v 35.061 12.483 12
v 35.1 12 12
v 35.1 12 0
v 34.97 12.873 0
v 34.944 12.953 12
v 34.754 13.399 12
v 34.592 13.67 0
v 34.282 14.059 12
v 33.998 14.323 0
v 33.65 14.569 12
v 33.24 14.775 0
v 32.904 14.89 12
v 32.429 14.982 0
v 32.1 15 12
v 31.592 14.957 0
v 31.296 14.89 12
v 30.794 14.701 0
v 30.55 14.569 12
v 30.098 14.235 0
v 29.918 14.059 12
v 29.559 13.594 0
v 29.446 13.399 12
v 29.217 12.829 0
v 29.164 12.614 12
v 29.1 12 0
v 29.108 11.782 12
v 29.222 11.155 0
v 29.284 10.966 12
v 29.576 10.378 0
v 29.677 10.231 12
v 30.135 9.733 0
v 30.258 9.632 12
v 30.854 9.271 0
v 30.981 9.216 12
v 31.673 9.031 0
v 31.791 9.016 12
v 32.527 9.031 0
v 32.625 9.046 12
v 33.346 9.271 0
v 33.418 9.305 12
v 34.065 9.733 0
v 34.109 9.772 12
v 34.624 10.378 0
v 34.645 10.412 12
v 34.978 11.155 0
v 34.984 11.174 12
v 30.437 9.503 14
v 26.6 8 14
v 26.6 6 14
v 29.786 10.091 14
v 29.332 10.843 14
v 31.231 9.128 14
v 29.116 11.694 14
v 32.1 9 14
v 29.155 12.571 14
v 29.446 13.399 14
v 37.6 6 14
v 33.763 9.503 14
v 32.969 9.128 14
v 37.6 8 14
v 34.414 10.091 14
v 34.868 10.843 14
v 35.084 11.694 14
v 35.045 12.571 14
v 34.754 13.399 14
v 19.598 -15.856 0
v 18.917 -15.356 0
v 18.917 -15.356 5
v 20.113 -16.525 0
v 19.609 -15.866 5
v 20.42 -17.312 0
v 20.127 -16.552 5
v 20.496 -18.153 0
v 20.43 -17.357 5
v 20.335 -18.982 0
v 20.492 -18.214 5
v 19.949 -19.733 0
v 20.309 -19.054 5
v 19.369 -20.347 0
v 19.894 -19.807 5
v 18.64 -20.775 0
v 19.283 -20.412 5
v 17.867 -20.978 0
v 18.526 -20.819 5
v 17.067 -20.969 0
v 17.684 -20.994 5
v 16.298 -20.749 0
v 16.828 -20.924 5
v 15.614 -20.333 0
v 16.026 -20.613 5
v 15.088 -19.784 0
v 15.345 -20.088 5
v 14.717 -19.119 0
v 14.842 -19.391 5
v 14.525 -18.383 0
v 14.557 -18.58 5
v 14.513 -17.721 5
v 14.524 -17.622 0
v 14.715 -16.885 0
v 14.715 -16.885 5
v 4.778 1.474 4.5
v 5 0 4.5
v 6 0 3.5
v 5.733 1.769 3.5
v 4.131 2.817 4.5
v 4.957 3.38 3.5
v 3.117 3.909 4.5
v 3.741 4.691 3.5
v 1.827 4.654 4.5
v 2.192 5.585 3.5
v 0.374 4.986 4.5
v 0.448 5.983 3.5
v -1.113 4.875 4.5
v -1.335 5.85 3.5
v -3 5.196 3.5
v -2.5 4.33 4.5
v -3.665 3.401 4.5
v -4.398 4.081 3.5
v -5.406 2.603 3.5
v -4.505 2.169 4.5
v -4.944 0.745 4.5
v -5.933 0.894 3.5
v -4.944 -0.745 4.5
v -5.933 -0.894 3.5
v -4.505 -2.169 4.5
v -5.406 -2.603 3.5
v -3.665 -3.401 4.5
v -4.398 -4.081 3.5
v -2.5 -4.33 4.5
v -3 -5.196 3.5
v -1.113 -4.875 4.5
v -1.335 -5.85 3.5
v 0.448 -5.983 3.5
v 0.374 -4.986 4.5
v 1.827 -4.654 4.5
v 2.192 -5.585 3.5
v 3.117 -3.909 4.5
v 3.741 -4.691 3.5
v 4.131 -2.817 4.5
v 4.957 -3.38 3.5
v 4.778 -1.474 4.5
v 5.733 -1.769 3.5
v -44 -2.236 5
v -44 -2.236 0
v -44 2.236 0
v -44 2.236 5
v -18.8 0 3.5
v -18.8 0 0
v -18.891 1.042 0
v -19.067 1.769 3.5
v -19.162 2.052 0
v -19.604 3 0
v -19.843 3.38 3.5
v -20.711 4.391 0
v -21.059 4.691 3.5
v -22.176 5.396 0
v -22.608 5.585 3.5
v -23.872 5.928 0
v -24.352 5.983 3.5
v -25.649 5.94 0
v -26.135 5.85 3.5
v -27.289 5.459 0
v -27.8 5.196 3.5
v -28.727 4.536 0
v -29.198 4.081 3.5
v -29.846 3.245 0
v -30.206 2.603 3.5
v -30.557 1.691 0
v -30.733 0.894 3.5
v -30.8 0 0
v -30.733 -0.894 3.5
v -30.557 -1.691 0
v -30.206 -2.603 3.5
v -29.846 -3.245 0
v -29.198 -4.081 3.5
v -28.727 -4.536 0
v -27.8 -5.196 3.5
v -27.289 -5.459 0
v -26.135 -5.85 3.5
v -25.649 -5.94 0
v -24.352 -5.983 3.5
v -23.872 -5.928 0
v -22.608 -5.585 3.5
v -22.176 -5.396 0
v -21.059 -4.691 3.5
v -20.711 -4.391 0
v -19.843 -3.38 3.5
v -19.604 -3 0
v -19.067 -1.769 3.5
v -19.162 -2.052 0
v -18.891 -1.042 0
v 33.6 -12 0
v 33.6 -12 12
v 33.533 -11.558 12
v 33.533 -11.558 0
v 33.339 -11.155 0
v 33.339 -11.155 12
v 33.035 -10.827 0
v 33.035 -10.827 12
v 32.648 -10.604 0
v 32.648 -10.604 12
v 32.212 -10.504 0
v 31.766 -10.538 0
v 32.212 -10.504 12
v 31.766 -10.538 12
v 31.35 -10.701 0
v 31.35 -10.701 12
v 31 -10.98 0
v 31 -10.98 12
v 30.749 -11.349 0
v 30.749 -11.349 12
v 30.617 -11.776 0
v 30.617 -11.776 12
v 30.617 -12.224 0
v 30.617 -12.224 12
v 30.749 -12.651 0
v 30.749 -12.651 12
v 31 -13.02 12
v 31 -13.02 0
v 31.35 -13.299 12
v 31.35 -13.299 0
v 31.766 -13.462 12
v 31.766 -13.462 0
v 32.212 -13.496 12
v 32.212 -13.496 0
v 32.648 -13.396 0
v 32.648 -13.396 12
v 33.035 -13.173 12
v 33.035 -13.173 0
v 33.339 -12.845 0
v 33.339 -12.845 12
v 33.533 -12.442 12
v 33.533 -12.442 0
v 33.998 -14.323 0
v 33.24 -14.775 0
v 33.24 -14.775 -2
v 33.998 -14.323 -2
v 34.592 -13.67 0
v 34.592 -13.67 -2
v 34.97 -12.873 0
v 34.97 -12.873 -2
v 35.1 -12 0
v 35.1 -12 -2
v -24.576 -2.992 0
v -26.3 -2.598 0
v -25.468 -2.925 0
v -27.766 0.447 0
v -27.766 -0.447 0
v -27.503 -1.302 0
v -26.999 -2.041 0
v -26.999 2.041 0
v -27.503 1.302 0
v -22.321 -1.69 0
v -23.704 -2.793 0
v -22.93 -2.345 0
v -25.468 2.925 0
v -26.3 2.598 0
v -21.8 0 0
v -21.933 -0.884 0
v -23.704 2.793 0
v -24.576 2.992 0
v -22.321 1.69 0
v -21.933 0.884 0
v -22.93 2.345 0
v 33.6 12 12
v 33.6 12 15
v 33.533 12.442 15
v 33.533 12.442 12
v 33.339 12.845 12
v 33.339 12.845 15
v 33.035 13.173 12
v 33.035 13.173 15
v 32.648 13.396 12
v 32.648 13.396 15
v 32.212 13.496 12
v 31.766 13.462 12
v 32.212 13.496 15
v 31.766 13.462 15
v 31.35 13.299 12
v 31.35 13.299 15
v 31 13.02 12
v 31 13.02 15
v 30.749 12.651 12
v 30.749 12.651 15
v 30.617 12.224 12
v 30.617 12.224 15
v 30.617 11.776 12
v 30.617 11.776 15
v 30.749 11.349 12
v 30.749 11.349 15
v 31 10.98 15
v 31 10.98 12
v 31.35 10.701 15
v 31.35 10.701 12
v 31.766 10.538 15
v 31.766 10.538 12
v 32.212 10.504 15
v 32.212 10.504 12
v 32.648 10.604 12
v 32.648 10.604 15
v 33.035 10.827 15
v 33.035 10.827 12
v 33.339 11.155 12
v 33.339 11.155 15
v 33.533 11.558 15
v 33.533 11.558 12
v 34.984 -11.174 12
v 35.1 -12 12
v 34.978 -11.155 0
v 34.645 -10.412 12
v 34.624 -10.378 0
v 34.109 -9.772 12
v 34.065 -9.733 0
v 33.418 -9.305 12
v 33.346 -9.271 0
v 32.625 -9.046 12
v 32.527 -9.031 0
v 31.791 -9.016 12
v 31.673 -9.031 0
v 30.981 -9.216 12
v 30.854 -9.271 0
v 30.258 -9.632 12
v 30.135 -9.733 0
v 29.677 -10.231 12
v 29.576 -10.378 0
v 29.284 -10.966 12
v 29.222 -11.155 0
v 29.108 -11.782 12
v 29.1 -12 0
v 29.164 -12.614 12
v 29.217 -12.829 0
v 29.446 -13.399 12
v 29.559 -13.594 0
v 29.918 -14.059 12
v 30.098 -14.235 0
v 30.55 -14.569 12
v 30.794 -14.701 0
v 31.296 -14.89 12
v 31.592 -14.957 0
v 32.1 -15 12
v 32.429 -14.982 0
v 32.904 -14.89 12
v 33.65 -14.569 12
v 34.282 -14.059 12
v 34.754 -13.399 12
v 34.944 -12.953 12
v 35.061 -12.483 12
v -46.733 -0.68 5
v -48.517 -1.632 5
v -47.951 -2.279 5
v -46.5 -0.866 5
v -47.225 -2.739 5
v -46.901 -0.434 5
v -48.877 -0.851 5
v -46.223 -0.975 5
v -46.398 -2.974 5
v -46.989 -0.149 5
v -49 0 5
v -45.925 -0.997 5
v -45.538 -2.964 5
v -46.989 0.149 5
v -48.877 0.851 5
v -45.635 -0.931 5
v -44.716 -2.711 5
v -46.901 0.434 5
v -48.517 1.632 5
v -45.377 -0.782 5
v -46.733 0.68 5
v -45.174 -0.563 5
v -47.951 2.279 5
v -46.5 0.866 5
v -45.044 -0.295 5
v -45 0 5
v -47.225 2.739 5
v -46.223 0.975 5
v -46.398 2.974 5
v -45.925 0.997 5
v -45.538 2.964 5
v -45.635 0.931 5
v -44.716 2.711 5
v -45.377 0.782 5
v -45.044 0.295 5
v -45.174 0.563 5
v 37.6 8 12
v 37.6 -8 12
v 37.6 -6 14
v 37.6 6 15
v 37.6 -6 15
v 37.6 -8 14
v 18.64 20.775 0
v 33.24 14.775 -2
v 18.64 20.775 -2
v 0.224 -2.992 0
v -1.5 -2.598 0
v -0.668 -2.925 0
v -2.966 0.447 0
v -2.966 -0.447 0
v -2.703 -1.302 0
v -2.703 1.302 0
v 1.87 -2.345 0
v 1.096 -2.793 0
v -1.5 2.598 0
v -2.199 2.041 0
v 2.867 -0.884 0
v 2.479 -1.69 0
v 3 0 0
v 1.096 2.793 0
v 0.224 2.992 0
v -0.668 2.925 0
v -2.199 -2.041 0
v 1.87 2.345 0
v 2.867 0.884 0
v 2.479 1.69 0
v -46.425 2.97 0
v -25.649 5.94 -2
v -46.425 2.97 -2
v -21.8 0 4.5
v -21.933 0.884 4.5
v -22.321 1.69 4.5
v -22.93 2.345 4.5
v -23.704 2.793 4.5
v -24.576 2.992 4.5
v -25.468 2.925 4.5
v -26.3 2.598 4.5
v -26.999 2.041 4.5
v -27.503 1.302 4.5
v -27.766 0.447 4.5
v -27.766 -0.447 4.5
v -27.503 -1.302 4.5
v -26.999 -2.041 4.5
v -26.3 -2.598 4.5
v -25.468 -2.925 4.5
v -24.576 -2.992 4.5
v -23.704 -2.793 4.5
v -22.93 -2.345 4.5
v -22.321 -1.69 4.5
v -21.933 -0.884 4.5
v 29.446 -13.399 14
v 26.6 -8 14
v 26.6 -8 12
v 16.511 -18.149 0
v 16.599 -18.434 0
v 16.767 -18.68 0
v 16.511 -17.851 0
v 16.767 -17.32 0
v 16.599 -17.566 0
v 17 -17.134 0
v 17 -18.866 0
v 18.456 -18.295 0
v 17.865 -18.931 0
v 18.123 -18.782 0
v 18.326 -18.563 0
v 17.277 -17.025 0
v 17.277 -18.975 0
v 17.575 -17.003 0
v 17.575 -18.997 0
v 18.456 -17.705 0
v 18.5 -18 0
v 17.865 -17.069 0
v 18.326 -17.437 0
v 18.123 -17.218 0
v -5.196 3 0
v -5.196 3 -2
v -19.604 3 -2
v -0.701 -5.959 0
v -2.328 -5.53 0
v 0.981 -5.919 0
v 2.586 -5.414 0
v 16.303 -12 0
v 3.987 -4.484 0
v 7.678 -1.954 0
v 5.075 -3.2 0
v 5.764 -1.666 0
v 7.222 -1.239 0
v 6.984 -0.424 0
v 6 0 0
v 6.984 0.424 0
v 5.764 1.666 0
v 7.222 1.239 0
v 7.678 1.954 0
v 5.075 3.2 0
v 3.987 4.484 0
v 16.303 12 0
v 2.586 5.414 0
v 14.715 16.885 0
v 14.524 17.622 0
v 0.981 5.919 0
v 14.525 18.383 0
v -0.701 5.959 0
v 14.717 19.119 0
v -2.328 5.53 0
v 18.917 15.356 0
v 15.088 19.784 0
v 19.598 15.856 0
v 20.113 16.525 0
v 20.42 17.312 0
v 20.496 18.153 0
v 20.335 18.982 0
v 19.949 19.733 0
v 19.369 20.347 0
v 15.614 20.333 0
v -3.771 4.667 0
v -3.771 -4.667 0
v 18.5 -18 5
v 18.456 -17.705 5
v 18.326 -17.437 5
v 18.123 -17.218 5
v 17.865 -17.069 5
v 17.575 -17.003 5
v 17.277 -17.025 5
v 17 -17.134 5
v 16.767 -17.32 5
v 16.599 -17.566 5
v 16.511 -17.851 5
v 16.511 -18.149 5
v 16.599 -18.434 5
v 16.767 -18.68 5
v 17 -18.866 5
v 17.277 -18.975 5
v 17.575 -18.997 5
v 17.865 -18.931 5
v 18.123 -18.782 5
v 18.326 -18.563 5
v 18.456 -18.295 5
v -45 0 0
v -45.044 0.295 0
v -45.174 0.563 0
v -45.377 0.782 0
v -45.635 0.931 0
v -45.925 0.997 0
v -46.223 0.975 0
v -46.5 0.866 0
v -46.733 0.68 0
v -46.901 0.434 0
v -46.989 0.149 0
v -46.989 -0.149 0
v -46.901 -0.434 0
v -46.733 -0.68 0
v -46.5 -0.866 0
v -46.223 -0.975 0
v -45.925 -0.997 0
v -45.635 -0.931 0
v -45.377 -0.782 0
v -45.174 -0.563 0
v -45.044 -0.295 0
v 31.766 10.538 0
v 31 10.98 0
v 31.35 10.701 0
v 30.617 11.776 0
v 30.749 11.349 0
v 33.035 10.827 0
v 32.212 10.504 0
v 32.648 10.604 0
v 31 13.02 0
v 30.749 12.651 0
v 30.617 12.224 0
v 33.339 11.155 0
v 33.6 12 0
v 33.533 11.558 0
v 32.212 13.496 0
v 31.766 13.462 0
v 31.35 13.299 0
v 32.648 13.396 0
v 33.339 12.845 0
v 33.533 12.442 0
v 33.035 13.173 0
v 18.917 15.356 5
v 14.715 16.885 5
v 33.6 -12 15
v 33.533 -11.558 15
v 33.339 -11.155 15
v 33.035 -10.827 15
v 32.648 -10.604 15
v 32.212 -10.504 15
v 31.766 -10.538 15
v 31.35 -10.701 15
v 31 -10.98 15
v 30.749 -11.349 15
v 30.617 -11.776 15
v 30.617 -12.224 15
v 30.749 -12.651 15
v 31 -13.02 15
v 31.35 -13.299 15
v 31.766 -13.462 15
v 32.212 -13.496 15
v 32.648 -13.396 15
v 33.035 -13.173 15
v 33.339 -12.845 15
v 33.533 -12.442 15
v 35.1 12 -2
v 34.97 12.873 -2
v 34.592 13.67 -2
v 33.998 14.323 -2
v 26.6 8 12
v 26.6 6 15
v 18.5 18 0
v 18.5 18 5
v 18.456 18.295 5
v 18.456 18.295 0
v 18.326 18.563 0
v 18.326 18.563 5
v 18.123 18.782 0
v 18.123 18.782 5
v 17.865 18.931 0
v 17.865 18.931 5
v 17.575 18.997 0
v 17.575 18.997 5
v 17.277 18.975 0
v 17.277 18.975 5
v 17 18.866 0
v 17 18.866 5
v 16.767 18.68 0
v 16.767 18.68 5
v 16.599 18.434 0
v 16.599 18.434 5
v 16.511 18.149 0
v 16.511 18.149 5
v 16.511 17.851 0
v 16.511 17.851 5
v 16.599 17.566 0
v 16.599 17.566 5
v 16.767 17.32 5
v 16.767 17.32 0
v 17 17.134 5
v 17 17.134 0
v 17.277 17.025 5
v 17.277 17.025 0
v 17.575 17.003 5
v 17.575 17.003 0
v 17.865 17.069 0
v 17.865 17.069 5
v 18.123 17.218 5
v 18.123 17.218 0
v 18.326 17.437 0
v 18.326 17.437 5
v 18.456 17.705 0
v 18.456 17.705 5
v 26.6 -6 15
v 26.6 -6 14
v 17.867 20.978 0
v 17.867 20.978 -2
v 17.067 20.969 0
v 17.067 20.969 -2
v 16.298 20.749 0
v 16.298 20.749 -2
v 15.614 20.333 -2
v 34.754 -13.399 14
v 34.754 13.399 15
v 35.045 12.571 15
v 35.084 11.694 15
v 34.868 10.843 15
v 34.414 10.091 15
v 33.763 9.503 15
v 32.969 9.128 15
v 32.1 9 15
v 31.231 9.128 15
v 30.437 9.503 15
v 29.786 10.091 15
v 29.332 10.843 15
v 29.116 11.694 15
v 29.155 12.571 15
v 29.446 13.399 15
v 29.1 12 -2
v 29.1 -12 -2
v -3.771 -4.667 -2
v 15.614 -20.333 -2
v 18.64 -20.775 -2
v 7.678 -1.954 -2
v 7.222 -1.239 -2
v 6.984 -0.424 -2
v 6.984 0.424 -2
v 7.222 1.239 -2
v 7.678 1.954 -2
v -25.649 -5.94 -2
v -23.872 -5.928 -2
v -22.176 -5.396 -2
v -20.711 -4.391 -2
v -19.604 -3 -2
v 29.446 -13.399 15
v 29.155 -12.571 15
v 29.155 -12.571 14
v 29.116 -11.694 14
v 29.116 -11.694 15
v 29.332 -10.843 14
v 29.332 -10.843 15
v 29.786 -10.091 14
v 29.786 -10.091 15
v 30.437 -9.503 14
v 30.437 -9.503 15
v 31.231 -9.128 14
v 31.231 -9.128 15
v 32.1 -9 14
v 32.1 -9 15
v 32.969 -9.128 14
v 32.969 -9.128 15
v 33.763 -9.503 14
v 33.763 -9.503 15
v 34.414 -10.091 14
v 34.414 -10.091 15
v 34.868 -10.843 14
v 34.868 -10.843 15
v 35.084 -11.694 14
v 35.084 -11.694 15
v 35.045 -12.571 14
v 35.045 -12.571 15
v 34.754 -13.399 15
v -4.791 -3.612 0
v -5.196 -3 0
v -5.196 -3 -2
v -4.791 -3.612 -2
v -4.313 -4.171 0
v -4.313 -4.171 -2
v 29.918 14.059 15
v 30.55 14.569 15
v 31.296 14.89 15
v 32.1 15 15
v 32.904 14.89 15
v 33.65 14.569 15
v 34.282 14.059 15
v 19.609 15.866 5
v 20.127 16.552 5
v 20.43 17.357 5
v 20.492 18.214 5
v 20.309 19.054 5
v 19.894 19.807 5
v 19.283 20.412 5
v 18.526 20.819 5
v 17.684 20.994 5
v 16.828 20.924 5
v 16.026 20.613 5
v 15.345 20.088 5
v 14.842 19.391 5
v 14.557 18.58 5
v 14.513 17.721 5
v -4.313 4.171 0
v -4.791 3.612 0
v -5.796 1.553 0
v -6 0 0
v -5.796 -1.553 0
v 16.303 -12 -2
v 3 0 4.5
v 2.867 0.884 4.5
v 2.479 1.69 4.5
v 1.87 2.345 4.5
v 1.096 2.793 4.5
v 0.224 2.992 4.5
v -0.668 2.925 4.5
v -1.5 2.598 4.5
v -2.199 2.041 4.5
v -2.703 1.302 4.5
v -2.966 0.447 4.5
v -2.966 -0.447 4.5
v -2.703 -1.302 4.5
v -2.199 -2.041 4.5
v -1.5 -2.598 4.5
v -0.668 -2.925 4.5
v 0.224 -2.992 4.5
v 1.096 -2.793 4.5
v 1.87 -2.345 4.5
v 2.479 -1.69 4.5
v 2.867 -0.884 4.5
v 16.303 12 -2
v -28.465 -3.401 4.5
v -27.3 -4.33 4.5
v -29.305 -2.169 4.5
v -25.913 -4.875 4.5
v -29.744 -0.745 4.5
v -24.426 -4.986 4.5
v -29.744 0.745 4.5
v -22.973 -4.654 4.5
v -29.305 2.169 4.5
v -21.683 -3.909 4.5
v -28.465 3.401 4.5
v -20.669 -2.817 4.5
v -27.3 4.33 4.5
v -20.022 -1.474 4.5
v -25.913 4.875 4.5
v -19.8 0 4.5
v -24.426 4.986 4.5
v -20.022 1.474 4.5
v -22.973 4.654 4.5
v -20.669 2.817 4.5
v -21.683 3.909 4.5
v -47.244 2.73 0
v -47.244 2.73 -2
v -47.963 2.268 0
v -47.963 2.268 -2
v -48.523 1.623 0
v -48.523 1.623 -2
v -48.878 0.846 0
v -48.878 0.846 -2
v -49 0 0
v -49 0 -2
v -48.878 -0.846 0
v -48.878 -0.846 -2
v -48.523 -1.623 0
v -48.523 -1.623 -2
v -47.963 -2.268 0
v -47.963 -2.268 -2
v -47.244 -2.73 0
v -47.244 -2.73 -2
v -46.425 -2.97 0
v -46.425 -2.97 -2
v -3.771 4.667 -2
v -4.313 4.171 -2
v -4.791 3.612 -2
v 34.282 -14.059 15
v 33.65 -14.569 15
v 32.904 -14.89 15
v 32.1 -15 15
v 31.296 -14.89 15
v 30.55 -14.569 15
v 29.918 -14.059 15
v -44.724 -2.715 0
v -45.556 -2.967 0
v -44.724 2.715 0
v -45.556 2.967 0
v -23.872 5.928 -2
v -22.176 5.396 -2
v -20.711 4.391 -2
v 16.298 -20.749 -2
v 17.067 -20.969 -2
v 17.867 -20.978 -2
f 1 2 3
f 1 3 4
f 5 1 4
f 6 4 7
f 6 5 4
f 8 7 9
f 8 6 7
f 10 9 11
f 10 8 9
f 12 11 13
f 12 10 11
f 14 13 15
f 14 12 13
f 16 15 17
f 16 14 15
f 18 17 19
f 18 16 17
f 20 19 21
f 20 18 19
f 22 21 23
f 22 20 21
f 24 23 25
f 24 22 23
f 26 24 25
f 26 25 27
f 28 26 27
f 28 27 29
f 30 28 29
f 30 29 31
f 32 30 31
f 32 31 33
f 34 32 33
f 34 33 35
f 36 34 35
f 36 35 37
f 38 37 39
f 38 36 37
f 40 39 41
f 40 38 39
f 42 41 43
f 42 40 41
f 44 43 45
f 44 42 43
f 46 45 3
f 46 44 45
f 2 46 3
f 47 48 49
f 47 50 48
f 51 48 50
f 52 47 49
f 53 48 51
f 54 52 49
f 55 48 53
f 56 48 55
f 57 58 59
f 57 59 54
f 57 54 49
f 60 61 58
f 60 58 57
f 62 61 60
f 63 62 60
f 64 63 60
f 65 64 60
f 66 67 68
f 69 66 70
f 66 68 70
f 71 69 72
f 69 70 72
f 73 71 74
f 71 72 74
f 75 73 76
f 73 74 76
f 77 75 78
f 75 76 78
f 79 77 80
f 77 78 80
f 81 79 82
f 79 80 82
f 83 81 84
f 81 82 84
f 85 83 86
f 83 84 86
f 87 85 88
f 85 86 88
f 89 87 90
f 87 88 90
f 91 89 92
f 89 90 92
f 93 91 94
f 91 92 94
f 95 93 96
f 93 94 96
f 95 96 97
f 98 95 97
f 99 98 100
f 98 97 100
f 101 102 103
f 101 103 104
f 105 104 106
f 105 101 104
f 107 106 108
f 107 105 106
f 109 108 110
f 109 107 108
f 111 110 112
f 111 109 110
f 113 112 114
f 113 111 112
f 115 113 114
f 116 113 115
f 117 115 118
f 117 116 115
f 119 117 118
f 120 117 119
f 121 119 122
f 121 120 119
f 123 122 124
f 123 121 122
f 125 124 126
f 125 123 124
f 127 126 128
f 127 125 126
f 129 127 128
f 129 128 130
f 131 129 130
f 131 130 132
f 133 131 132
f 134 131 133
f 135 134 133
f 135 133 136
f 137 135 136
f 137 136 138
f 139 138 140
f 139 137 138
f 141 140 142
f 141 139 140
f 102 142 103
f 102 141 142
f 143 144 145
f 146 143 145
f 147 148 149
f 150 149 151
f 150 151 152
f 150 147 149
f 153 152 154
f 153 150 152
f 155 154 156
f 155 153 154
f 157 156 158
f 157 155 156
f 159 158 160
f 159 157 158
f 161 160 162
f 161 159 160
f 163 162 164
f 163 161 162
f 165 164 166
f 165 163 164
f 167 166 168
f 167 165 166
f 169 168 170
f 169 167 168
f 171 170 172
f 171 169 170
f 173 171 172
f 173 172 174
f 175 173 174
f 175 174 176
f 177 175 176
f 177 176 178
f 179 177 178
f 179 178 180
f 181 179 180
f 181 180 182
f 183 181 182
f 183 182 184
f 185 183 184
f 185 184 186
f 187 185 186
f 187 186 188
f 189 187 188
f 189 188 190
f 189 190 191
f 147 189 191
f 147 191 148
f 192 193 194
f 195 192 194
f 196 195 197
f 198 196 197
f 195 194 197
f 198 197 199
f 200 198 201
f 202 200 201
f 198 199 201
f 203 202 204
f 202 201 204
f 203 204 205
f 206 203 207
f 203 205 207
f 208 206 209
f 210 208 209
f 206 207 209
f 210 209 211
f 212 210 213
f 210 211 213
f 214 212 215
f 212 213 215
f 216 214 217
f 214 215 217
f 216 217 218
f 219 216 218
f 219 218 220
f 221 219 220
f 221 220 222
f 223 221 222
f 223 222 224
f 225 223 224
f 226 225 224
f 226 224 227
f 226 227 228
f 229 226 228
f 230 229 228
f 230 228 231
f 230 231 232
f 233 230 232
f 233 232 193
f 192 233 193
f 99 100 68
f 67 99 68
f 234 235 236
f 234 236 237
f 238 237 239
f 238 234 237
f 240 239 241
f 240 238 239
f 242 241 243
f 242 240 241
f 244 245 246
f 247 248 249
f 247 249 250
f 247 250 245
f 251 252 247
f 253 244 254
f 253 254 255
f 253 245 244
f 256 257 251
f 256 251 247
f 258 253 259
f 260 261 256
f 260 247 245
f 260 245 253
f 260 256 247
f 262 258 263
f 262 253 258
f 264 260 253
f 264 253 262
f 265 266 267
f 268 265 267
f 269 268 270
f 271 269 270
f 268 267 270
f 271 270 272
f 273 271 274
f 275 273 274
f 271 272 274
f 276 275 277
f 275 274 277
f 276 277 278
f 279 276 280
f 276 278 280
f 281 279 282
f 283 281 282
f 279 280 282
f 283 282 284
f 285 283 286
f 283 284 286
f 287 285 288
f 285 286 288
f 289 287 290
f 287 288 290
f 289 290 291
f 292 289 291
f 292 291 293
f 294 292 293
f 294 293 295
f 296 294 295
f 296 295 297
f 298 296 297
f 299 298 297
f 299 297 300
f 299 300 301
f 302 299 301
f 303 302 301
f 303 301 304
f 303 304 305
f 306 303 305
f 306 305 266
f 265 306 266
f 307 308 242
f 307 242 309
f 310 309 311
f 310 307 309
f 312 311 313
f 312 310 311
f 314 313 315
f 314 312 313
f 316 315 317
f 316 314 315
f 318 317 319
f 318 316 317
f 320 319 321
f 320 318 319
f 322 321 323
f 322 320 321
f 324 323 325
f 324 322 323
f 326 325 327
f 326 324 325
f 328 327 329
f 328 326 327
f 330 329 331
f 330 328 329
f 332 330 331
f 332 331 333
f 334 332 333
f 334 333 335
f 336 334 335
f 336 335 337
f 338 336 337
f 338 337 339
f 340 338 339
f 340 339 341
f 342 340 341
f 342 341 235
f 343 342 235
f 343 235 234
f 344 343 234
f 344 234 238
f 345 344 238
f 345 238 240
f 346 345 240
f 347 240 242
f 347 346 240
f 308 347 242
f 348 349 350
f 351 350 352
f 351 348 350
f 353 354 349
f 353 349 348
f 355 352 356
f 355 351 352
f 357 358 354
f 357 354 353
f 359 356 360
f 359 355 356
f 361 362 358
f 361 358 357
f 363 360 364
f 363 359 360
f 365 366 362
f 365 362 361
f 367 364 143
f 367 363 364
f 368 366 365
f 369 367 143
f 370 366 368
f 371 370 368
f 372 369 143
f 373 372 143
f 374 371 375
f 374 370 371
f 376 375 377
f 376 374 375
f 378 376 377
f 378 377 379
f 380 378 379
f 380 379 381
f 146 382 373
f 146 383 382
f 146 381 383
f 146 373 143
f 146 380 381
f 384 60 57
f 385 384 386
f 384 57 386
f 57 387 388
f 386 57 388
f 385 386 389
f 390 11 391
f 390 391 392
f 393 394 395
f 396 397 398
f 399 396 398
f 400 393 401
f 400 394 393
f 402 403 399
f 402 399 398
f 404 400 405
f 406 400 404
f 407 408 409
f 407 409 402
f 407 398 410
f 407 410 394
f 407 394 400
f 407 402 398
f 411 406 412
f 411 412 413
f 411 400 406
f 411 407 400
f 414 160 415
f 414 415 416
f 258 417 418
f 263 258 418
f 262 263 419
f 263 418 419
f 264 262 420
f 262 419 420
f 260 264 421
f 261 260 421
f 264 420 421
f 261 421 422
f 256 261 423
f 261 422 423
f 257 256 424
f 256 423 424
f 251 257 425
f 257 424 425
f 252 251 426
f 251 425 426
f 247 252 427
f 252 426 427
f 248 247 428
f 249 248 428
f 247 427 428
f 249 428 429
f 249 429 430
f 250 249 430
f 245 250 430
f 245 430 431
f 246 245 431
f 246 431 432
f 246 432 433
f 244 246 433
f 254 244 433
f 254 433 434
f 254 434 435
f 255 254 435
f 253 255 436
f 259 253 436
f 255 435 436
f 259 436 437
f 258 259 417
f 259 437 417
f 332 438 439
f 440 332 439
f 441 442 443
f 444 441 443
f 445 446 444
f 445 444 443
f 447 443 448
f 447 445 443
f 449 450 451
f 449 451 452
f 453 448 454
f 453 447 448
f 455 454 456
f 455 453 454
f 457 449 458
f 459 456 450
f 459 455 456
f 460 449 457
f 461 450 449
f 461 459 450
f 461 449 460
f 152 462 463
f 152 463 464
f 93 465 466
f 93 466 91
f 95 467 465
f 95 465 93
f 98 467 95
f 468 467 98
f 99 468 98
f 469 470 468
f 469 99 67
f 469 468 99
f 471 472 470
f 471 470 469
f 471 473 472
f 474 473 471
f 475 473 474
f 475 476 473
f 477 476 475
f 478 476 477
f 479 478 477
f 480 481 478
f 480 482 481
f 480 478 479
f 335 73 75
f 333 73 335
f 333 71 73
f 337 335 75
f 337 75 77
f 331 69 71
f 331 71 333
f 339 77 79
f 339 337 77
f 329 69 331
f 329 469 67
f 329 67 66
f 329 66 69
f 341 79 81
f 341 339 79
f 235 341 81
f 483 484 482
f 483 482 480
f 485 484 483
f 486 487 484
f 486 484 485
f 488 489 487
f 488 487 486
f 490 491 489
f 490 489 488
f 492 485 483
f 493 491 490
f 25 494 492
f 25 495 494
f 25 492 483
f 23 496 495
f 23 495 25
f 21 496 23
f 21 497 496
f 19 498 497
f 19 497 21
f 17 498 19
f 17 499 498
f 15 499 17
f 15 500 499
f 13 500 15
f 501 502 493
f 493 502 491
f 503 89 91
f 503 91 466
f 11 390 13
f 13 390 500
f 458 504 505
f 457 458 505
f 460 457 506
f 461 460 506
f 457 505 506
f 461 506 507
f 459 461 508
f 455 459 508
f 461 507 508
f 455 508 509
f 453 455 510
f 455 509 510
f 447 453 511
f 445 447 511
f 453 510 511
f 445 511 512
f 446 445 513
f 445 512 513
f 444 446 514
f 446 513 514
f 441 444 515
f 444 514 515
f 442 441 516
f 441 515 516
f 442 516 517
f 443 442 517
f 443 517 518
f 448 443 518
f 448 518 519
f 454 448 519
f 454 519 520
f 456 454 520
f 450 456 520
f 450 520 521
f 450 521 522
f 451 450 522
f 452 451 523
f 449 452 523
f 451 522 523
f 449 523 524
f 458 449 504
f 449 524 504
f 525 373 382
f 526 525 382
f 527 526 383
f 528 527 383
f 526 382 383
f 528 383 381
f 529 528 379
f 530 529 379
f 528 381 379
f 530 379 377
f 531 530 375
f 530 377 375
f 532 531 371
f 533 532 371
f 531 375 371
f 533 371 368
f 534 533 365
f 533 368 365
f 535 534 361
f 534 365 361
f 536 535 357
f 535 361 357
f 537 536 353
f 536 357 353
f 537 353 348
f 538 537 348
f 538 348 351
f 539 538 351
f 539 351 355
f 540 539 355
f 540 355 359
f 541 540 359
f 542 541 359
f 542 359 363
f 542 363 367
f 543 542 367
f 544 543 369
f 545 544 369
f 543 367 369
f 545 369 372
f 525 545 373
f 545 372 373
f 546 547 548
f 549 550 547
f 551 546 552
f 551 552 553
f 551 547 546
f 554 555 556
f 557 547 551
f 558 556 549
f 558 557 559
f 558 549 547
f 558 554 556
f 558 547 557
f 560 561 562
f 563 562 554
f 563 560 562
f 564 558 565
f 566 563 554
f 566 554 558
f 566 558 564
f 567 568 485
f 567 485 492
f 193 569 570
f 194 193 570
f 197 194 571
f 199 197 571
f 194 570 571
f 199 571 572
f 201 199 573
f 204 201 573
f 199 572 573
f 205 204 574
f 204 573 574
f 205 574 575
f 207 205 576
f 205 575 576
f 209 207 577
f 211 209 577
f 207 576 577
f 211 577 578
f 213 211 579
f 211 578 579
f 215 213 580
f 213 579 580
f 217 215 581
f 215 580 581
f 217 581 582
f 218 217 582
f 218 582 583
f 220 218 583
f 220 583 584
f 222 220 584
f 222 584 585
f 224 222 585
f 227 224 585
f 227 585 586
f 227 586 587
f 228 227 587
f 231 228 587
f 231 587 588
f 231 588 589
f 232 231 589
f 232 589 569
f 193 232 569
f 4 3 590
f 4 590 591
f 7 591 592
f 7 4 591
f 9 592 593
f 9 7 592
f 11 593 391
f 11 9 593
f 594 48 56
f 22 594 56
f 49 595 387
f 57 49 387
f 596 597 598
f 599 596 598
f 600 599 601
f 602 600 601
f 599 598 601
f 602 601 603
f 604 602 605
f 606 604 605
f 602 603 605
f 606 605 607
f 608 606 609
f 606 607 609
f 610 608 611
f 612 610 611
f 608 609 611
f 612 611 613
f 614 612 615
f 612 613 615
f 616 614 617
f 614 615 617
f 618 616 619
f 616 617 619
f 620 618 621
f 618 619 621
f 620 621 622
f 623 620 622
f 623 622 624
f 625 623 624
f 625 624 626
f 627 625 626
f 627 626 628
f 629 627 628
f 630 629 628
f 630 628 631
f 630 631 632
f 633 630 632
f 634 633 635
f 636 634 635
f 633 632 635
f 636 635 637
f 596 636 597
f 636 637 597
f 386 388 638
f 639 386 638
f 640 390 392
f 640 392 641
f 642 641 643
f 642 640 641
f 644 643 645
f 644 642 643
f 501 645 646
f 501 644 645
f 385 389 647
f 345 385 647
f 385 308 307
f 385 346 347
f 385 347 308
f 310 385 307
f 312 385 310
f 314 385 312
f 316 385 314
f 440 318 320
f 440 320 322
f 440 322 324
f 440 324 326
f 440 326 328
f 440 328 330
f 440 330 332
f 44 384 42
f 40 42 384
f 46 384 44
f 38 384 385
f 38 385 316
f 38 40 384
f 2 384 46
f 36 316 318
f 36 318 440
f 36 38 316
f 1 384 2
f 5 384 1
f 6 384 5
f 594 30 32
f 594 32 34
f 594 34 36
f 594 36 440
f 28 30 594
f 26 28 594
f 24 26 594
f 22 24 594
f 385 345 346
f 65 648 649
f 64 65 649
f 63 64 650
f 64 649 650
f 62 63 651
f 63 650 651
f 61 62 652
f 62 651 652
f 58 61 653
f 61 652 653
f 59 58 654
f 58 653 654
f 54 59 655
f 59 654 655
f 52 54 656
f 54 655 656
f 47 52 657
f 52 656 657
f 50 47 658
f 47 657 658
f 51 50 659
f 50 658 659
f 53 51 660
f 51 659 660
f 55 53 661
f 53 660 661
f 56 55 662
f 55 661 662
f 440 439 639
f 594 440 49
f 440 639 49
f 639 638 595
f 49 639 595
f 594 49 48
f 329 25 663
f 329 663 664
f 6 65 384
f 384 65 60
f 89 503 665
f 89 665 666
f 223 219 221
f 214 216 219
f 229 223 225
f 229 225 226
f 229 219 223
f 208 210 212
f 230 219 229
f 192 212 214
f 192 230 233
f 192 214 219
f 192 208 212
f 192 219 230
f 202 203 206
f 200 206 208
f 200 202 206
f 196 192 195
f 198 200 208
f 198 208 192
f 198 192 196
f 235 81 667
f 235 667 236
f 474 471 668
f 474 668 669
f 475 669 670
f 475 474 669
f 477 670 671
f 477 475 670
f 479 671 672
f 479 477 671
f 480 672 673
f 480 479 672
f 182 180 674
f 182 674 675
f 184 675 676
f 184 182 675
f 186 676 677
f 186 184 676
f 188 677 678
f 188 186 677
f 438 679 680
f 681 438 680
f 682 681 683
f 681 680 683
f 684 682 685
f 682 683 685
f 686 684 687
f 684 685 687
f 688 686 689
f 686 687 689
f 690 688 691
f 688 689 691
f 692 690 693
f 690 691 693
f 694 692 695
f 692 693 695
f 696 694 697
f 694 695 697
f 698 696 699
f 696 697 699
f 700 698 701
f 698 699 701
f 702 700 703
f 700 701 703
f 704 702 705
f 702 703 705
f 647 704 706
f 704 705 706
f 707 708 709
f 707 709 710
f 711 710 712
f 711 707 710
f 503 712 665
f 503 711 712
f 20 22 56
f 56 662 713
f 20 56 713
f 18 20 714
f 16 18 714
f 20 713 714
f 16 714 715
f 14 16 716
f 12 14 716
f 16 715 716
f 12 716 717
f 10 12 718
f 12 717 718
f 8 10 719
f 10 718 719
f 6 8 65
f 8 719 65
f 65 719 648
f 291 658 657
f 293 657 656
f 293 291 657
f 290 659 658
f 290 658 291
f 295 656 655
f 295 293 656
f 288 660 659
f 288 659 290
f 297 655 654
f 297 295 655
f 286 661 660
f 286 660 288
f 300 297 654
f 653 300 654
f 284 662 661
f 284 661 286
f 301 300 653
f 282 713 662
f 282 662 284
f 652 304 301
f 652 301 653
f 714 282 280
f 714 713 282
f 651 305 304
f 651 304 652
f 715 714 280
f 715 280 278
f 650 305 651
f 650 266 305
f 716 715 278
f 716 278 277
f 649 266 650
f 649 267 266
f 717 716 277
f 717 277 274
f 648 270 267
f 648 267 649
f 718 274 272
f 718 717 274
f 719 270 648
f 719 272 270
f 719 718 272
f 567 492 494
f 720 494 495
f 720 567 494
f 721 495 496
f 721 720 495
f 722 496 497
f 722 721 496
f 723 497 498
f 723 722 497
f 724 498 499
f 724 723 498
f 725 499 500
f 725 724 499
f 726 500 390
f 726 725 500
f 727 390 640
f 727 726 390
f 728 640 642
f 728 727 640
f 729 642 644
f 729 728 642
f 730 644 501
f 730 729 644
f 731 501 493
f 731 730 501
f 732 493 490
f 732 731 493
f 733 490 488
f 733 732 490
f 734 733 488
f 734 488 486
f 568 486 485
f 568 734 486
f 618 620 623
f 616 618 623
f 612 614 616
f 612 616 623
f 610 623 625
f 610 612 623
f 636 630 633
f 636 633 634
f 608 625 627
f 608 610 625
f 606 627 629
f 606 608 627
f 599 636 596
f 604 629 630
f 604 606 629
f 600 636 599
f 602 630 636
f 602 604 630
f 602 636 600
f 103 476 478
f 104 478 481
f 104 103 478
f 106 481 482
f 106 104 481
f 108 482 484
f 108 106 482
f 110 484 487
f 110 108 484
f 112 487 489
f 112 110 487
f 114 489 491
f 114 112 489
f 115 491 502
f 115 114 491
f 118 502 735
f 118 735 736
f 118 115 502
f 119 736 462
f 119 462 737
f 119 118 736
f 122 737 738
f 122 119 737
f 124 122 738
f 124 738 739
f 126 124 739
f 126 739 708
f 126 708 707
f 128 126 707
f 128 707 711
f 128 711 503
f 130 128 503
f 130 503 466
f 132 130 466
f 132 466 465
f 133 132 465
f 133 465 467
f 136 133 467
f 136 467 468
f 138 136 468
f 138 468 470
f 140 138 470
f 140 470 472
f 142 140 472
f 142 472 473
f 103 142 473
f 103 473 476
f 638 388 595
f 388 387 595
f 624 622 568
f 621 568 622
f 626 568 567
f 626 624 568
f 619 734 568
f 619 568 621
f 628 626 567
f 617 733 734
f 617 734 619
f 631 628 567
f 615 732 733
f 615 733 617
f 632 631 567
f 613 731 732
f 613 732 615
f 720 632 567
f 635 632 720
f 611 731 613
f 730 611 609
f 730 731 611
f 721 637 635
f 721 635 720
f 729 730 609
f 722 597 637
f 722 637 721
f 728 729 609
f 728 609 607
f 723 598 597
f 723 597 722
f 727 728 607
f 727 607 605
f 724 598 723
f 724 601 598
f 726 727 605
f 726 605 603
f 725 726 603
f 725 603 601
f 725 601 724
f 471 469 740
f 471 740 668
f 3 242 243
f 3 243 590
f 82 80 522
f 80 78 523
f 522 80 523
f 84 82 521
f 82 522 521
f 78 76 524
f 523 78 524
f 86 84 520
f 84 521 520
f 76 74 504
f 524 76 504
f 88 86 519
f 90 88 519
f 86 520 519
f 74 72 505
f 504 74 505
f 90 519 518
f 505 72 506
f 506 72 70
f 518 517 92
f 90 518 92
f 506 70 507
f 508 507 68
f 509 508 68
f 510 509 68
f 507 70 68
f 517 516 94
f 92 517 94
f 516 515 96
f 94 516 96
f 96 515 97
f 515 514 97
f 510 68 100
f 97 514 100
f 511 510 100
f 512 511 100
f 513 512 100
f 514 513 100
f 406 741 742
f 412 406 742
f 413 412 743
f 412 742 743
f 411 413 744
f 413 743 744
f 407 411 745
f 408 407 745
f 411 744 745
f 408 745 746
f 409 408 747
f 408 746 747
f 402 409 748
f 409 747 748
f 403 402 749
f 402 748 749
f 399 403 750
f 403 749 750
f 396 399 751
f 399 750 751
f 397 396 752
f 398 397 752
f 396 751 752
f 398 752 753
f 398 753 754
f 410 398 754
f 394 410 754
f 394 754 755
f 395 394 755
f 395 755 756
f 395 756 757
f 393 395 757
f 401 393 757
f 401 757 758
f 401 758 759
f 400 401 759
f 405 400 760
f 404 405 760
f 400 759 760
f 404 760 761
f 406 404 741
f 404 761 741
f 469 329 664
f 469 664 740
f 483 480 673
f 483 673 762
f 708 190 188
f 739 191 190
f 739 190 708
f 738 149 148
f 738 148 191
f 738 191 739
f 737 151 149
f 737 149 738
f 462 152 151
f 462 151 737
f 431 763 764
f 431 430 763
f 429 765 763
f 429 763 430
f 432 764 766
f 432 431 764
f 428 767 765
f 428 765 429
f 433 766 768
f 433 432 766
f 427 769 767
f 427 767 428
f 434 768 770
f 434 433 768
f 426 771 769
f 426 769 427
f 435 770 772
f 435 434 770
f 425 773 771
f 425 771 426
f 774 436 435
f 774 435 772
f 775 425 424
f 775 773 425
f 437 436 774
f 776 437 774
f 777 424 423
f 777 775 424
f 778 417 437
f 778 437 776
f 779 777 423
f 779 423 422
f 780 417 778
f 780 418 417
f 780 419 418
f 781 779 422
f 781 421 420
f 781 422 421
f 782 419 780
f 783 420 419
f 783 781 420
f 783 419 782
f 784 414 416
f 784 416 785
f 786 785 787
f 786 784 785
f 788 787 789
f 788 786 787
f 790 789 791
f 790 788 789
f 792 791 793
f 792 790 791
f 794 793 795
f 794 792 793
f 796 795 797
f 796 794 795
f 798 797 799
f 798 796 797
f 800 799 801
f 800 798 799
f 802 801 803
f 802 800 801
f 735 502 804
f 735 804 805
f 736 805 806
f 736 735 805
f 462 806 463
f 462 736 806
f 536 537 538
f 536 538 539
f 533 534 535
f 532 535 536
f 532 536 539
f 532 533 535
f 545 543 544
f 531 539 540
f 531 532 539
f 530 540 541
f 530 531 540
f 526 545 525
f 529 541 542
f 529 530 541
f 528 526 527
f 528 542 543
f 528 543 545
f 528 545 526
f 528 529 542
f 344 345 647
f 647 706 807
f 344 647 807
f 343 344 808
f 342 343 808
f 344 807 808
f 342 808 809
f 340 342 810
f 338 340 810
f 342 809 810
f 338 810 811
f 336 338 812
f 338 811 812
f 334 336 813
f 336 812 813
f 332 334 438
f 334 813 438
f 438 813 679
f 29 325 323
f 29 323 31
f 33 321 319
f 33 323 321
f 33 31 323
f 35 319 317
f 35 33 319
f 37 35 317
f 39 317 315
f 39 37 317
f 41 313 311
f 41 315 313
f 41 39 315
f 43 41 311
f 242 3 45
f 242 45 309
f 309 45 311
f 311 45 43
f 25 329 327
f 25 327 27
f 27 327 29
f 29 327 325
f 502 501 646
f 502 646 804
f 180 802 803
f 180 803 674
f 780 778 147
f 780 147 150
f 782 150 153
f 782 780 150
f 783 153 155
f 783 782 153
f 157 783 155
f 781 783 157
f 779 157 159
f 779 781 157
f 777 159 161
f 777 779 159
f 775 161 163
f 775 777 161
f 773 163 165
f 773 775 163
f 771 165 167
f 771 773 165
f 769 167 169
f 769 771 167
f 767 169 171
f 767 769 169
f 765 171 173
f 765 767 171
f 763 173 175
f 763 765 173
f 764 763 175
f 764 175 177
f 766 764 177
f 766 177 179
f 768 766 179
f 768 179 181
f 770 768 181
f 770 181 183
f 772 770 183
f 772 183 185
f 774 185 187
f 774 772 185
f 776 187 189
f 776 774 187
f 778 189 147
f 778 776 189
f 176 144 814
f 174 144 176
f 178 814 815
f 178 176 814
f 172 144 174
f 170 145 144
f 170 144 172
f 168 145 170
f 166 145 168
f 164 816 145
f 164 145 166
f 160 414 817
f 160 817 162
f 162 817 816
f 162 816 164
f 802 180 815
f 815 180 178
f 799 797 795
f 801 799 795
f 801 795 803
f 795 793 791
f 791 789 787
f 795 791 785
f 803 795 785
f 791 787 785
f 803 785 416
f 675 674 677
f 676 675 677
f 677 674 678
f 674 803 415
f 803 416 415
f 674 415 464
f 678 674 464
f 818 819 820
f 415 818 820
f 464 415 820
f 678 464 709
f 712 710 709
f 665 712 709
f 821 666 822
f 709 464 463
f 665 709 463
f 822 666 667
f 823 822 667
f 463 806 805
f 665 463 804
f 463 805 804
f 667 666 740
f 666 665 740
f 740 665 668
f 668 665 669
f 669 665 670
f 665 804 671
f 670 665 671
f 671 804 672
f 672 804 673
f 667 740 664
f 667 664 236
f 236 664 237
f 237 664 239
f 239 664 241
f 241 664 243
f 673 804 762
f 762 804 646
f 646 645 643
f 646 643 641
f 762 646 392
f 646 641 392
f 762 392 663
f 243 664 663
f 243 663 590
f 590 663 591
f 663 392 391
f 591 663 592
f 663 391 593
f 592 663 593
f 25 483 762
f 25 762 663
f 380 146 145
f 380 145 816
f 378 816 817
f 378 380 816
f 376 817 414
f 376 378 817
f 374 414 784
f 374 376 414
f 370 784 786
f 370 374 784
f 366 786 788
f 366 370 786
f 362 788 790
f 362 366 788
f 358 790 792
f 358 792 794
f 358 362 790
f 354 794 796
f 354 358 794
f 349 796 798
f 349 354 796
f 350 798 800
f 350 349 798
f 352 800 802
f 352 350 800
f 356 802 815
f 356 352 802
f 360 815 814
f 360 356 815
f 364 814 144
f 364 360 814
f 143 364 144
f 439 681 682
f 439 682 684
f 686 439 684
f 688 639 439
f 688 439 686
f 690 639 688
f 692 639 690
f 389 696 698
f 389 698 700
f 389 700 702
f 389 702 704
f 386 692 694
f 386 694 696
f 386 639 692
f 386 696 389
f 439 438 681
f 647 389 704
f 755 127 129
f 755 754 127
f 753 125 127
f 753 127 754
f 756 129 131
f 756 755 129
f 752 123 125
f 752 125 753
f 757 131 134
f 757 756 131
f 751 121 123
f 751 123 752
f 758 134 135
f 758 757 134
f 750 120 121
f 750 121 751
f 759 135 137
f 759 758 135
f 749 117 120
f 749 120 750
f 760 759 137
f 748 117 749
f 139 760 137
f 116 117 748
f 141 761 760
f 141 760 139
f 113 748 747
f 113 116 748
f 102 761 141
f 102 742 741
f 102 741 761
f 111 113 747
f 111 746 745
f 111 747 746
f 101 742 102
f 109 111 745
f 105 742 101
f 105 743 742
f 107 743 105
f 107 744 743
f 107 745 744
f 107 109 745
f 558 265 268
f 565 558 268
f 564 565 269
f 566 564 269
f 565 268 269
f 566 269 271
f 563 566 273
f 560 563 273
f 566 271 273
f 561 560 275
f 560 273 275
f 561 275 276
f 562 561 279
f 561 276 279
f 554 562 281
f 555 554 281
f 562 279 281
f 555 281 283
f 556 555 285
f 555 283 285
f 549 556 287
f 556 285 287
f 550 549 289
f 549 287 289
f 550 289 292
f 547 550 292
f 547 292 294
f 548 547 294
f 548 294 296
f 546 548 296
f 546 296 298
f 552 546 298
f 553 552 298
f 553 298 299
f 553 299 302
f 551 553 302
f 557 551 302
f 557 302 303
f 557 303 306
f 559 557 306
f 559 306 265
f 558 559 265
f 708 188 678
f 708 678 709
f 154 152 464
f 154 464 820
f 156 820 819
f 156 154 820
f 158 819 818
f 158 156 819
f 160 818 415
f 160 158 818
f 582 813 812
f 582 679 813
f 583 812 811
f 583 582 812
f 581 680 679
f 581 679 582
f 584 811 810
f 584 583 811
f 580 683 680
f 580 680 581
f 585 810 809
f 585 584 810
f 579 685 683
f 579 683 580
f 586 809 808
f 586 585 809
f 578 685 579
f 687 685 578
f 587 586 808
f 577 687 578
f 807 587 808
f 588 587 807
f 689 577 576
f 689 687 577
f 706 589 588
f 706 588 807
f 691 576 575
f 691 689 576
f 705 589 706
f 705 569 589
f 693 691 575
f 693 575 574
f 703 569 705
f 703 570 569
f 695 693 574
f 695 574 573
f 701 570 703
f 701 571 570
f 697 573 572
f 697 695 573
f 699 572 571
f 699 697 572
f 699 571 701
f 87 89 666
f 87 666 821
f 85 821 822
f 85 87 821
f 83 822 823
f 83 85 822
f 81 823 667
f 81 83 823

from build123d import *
from build123d.topology import SkipClean

# Parameters (mm, degrees)
BOSS_EXTRUDE1_DEPTH = 2
BOSS_EXTRUDE2_START = 4.5
SKETCH2_R           = 6
SKETCH2_R_2         = 3
BOSS_EXTRUDE2_DEPTH = 4.5
CHAMFER1_SIZE       = 1
BOSS_EXTRUDE3_START = 5
SKETCH3_R           = 1
BOSS_EXTRUDE3_DEPTH = 5
BOSS_EXTRUDE4_START = 15
SKETCH4_R           = 3
SKETCH4_R_2         = 1.5
BOSS_EXTRUDE4_DEPTH = 15
SKETCH5_R           = 1.5
BOSS_EXTRUDE5_DEPTH = 3
CUT_EXTRUDE1_DEPTH  = 1


with BuildPart() as part:
    # Sketch1 → Boss-Extrude1 (new body)
    with BuildSketch(Plane.XY):
        with BuildLine():
            Line((-5.196152423, 3), (-19.603847577, 3))
            ThreePointArc((-19.603847577, 3), (-22.176137566, 5.39586378), (-25.649056604, 5.939621443))
            Line((-25.649056604, 5.939621443), (-46.424528302, 2.969810721))
            ThreePointArc((-46.424528302, 2.969810721), (-49, 0), (-46.424528302, -2.969810721))
            Line((-46.424528302, -2.969810721), (-25.649056604, -5.939621443))
            ThreePointArc((-25.649056604, -5.939621443), (-22.176137566, -5.39586378), (-19.603847577, -3))
            Line((-19.603847577, -3), (-5.196152423, -3))
            ThreePointArc((-5.196152423, -3), (-4.560521825, -3.898928146), (-3.771341235, -4.666581756))
            Line((-3.771341235, -4.666581756), (15.614329382, -20.333290878))
            ThreePointArc((15.614329382, -20.333290878), (17.066851522, -20.968565714), (18.640337336, -20.774820852))
            Line((18.640337336, -20.774820852), (33.240337336, -14.774820852))
            ThreePointArc((33.240337336, -14.774820852), (34.592088683, -13.670177833), (35.1, -12))
            Line((35.1, -12), (35.1, 12))
            ThreePointArc((35.1, 12), (34.592088683, 13.670177833), (33.240337336, 14.774820852))
            Line((33.240337336, 14.774820852), (18.640337336, 20.774820852))
            ThreePointArc((18.640337336, 20.774820852), (17.066851522, 20.968565714), (15.614329382, 20.333290878))
            Line((15.614329382, 20.333290878), (-3.771341235, 4.666581756))
            ThreePointArc((-3.771341235, 4.666581756), (-4.560521825, 3.898928146), (-5.196152423, 3))
        make_face()
        with BuildLine():
            Line((7.677811186, 1.954226556), (16.302661255, 12))
            Line((16.302661255, 12), (29.1, 12))
            Line((29.1, 12), (29.1, -12))
            Line((29.1, -12), (16.302661255, -12))
            Line((16.302661255, -12), (7.677811186, -1.954226556))
            ThreePointArc((7.677811186, -1.954226556), (6.953991883, 0), (7.677811186, 1.954226556))
        make_face(mode=Mode.SUBTRACT)
    extrude(amount=-BOSS_EXTRUDE1_DEPTH)

    # Sketch2 → Boss-Extrude2 (add)
    # profile 1 of 2: a face of its own
    with BuildSketch(Plane.XY.offset(BOSS_EXTRUDE2_START)):
        with Locations((-24.8, 0)):
            Circle(SKETCH2_R)
        with Locations((-24.8, 0)):
            Circle(SKETCH2_R_2, mode=Mode.SUBTRACT)
    # profile 2 of 2: a face of its own
    with BuildSketch(Plane.XY.offset(BOSS_EXTRUDE2_START)):
        Circle(SKETCH2_R)
        Circle(SKETCH2_R_2, mode=Mode.SUBTRACT)
    extrude(amount=-BOSS_EXTRUDE2_DEPTH)

    # Chamfer1
    chamfer1_edges = [part.edges().sort_by_distance(p)[0] for p in [
        (-30.8, 0, 4.5),
        (-6, 0, 4.5),
    ]]
    chamfer(chamfer1_edges, length=CHAMFER1_SIZE)

    # Sketch3 → Boss-Extrude3 (add)
    # profile 1 of 3: a face of its own
    with SkipClean():  # the faces are left unmerged after this step: merging them gives an invalid solid
        with BuildSketch(Plane.XY.offset(BOSS_EXTRUDE3_START)):
            with BuildLine():
                Line((-44, -2.236067977), (-44, 2.236067977))
                ThreePointArc((-44, 2.236067977), (-49, 0), (-44, -2.236067977))
            make_face()
            with Locations((-46, 0)):
                Circle(SKETCH3_R, mode=Mode.SUBTRACT)
        # profile 2 of 3: a face of its own
        with BuildSketch(Plane.XY.offset(BOSS_EXTRUDE3_START)):
            with BuildLine():
                Line((14.714743135, -16.885395049), (18.917176291, -15.355834468))
                ThreePointArc((18.917176291, -15.355834468), (18.52606043, -20.819077862), (14.714743135, -16.885395049))
            make_face()
            with Locations((17.5, -18)):
                Circle(SKETCH3_R, mode=Mode.SUBTRACT)
        # profile 3 of 3: a face of its own
        with BuildSketch(Plane.XY.offset(BOSS_EXTRUDE3_START)):
            with BuildLine():
                Line((14.714743135, 16.885395049), (18.917176291, 15.355834468))
                ThreePointArc((18.917176291, 15.355834468), (18.52606043, 20.819077862), (14.714743135, 16.885395049))
            make_face()
            with Locations((17.5, 18)):
                Circle(SKETCH3_R, mode=Mode.SUBTRACT)
        extrude(amount=-BOSS_EXTRUDE3_DEPTH)

    # Sketch4 → Boss-Extrude4 (add)
    # profile 1 of 2: a face of its own
    with SkipClean():  # the faces are left unmerged after this step: merging them gives an invalid solid
        with BuildSketch(Plane.XY.offset(BOSS_EXTRUDE4_START)):
            with Locations((32.1, -12)):
                Circle(SKETCH4_R)
            with Locations((32.1, -12)):
                Circle(SKETCH4_R_2, mode=Mode.SUBTRACT)
        # profile 2 of 2: a face of its own
        with BuildSketch(Plane.XY.offset(BOSS_EXTRUDE4_START)):
            with Locations((32.1, 12)):
                Circle(SKETCH4_R)
            with Locations((32.1, 12)):
                Circle(SKETCH4_R_2, mode=Mode.SUBTRACT)
        extrude(amount=-BOSS_EXTRUDE4_DEPTH)

    # Sketch5 → Boss-Extrude5 (add)
    with BuildSketch(Plane.XY.offset(15)):
        with BuildLine():
            Line((29.446176569, -13.399007218), (26.6, -8))
            Line((26.6, -8), (26.6, 8))
            Line((26.6, 8), (29.446176569, 13.399007218))
            ThreePointArc((29.446176569, 13.399007218), (32.1, 15), (34.753823431, 13.399007218))
            Line((34.753823431, 13.399007218), (37.6, 8))
            Line((37.6, 8), (37.6, -8))
            Line((37.6, -8), (34.753823431, -13.399007218))
            ThreePointArc((34.753823431, -13.399007218), (32.1, -15), (29.446176569, -13.399007218))
        make_face()
        with Locations((32.1, -12)):
            Circle(SKETCH5_R, mode=Mode.SUBTRACT)
        with Locations((32.1, 12)):
            Circle(SKETCH5_R, mode=Mode.SUBTRACT)
    extrude(amount=-BOSS_EXTRUDE5_DEPTH)

    # Sketch6 → Cut-Extrude1 (cut)
    with BuildSketch(Plane.XY.offset(15)):
        with BuildLine():
            Line((29.446176569, 13.399007218), (26.6, 8))
            Line((26.6, 8), (26.6, 6))
            Line((26.6, 6), (37.6, 6))
            Line((37.6, 6), (37.6, 8))
            Line((37.6, 8), (34.753823431, 13.399007218))
            ThreePointArc((34.753823431, 13.399007218), (32.1, 9), (29.446176569, 13.399007218))
        make_face()
        with BuildLine():
            Line((26.6, -8), (29.446176569, -13.399007218))
            ThreePointArc((29.446176569, -13.399007218), (32.1, -9), (34.753823431, -13.399007218))
            Line((34.753823431, -13.399007218), (37.6, -8))
            Line((37.6, -8), (37.6, -6))
            Line((37.6, -6), (26.6, -6))
            Line((26.6, -6), (26.6, -8))
        make_face()
    extrude(amount=-CUT_EXTRUDE1_DEPTH, mode=Mode.SUBTRACT)


solid = part.part
